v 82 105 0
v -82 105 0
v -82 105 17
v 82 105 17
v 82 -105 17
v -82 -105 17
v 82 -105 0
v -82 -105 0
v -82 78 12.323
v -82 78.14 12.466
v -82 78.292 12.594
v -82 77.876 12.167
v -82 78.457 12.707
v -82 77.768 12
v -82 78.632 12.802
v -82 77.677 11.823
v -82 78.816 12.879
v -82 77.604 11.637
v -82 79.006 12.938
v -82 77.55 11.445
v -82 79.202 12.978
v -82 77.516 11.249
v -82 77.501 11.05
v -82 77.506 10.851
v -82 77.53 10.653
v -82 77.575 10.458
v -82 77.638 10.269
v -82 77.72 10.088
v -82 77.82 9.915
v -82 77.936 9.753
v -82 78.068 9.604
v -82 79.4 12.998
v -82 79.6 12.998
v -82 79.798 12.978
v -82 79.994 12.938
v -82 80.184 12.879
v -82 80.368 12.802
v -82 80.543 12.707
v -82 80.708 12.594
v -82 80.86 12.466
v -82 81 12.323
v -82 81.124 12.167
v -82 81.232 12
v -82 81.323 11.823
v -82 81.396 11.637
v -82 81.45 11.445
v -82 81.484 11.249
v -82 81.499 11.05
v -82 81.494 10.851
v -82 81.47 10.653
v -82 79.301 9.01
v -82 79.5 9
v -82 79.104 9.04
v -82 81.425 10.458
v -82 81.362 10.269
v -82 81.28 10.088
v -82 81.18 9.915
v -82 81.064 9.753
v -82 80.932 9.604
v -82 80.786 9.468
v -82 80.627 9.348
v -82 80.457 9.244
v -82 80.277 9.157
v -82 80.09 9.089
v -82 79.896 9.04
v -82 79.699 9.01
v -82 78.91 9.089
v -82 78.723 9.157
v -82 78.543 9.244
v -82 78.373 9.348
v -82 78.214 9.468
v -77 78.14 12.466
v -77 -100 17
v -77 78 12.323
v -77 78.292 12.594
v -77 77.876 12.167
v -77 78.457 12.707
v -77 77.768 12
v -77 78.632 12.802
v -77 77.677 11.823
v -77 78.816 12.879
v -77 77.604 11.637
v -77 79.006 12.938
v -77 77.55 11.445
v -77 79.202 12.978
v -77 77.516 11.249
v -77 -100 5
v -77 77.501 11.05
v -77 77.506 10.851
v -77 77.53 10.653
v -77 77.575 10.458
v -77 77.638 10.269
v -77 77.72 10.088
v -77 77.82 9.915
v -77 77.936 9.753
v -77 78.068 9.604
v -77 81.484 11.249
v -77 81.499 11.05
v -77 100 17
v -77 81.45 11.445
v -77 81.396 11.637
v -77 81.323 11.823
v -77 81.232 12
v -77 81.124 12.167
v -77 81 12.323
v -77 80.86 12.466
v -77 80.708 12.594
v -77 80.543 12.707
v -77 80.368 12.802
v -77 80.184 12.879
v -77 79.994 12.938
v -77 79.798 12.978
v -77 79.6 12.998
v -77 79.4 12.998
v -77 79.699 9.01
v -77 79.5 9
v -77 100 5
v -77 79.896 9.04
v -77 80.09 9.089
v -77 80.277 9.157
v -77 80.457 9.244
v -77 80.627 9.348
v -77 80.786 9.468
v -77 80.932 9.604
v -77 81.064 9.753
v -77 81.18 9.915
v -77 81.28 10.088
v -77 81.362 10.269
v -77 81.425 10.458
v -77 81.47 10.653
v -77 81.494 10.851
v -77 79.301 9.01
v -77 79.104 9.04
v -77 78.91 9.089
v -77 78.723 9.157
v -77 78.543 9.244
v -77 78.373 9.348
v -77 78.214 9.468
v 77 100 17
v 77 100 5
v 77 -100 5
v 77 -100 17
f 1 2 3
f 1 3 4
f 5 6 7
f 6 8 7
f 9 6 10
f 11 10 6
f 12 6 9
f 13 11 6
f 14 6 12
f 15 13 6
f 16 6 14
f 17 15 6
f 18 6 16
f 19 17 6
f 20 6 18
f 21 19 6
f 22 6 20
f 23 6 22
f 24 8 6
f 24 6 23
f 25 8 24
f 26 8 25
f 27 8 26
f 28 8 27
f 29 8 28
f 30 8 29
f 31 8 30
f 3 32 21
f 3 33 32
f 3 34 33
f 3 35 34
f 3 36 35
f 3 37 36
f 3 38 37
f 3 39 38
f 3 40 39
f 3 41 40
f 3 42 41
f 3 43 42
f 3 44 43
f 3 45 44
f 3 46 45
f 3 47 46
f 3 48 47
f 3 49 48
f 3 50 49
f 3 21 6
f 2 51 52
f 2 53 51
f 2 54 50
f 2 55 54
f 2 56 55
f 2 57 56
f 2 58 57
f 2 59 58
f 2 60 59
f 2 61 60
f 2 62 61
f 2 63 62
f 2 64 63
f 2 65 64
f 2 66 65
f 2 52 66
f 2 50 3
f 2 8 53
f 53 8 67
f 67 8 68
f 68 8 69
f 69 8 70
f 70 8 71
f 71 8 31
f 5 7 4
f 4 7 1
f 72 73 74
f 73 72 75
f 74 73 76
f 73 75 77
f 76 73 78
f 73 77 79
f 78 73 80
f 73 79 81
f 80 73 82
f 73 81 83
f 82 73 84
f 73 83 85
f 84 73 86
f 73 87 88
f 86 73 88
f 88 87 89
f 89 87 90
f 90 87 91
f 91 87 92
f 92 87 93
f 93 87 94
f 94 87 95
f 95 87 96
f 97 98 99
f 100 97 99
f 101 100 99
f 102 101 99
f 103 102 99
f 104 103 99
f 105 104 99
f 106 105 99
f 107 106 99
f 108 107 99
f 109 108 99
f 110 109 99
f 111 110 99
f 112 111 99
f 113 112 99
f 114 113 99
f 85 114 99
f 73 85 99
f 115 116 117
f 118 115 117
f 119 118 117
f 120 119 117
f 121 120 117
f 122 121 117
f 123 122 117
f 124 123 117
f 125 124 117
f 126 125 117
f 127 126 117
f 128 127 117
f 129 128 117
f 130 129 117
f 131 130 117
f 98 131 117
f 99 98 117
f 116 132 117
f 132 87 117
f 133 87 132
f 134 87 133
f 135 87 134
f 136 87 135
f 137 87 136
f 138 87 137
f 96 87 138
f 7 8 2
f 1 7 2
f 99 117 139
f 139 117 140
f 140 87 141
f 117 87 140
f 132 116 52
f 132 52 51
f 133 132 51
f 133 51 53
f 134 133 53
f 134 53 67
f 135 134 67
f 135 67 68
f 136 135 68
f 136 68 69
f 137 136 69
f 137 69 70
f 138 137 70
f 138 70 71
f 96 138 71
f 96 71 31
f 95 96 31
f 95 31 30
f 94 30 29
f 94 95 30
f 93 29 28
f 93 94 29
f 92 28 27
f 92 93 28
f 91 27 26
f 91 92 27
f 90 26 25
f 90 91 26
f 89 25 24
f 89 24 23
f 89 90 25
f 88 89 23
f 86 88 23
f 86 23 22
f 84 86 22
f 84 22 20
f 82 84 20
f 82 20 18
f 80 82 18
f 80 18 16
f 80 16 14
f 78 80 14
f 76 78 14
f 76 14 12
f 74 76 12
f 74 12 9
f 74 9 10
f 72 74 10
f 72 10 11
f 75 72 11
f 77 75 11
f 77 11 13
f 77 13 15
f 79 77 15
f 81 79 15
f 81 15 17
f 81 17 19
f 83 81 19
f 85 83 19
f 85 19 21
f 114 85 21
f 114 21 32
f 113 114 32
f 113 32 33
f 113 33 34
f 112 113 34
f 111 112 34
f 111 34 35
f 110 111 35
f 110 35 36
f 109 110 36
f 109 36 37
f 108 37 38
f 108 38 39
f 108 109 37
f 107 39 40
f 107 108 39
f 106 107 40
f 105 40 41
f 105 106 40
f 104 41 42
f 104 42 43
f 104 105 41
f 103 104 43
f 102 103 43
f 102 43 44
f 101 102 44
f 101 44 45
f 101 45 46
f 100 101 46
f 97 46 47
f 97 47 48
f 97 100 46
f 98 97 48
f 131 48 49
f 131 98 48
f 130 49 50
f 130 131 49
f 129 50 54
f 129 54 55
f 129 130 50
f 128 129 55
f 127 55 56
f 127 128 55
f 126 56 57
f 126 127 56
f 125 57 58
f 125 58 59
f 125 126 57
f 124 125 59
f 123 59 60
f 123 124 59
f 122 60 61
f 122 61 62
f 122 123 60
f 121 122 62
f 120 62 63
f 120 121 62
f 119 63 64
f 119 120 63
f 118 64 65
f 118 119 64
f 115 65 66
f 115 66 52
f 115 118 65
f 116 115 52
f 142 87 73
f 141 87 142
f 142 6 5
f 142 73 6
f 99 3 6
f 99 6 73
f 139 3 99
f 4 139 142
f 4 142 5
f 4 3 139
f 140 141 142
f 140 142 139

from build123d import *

# Parameters (mm, degrees)
SKETCH1_W           = 210
SKETCH1_H           = 164
BOSS_EXTRUDE1_DEPTH = 5
SKETCH2_W           = 164
SKETCH2_H           = 210
SKETCH2_W_2         = 154
SKETCH2_H_2         = 200
BOSS_EXTRUDE2_DEPTH = 12
SKETCH3_R           = 2
CUT_EXTRUDE1_DEPTH  = 159


with BuildPart() as part:
    # Sketch1 → Boss-Extrude1 (new body)
    with BuildSketch(Plane(origin=(0, 0, 0), x_dir=(0, 1, 0), z_dir=(0, 0, 1))):
        Rectangle(SKETCH1_W, SKETCH1_H)
    extrude(amount=BOSS_EXTRUDE1_DEPTH)

    # Sketch2 → Boss-Extrude2 (add)
    with BuildSketch(Plane.XY.offset(5)):
        Rectangle(SKETCH2_W, SKETCH2_H)
        Rectangle(SKETCH2_W_2, SKETCH2_H_2, mode=Mode.SUBTRACT)
    extrude(amount=BOSS_EXTRUDE2_DEPTH)

    # Sketch3 → Cut-Extrude1 (cut)
    with BuildSketch(Plane(origin=(77, 0, 0), x_dir=(0, -1, 0), z_dir=(-1, 0, 0))):
        with Locations(Location((-79.5, 11, 0), (0, 0, 270))):
            Circle(SKETCH3_R)
    extrude(amount=CUT_EXTRUDE1_DEPTH, mode=Mode.SUBTRACT)


solid = part.part
